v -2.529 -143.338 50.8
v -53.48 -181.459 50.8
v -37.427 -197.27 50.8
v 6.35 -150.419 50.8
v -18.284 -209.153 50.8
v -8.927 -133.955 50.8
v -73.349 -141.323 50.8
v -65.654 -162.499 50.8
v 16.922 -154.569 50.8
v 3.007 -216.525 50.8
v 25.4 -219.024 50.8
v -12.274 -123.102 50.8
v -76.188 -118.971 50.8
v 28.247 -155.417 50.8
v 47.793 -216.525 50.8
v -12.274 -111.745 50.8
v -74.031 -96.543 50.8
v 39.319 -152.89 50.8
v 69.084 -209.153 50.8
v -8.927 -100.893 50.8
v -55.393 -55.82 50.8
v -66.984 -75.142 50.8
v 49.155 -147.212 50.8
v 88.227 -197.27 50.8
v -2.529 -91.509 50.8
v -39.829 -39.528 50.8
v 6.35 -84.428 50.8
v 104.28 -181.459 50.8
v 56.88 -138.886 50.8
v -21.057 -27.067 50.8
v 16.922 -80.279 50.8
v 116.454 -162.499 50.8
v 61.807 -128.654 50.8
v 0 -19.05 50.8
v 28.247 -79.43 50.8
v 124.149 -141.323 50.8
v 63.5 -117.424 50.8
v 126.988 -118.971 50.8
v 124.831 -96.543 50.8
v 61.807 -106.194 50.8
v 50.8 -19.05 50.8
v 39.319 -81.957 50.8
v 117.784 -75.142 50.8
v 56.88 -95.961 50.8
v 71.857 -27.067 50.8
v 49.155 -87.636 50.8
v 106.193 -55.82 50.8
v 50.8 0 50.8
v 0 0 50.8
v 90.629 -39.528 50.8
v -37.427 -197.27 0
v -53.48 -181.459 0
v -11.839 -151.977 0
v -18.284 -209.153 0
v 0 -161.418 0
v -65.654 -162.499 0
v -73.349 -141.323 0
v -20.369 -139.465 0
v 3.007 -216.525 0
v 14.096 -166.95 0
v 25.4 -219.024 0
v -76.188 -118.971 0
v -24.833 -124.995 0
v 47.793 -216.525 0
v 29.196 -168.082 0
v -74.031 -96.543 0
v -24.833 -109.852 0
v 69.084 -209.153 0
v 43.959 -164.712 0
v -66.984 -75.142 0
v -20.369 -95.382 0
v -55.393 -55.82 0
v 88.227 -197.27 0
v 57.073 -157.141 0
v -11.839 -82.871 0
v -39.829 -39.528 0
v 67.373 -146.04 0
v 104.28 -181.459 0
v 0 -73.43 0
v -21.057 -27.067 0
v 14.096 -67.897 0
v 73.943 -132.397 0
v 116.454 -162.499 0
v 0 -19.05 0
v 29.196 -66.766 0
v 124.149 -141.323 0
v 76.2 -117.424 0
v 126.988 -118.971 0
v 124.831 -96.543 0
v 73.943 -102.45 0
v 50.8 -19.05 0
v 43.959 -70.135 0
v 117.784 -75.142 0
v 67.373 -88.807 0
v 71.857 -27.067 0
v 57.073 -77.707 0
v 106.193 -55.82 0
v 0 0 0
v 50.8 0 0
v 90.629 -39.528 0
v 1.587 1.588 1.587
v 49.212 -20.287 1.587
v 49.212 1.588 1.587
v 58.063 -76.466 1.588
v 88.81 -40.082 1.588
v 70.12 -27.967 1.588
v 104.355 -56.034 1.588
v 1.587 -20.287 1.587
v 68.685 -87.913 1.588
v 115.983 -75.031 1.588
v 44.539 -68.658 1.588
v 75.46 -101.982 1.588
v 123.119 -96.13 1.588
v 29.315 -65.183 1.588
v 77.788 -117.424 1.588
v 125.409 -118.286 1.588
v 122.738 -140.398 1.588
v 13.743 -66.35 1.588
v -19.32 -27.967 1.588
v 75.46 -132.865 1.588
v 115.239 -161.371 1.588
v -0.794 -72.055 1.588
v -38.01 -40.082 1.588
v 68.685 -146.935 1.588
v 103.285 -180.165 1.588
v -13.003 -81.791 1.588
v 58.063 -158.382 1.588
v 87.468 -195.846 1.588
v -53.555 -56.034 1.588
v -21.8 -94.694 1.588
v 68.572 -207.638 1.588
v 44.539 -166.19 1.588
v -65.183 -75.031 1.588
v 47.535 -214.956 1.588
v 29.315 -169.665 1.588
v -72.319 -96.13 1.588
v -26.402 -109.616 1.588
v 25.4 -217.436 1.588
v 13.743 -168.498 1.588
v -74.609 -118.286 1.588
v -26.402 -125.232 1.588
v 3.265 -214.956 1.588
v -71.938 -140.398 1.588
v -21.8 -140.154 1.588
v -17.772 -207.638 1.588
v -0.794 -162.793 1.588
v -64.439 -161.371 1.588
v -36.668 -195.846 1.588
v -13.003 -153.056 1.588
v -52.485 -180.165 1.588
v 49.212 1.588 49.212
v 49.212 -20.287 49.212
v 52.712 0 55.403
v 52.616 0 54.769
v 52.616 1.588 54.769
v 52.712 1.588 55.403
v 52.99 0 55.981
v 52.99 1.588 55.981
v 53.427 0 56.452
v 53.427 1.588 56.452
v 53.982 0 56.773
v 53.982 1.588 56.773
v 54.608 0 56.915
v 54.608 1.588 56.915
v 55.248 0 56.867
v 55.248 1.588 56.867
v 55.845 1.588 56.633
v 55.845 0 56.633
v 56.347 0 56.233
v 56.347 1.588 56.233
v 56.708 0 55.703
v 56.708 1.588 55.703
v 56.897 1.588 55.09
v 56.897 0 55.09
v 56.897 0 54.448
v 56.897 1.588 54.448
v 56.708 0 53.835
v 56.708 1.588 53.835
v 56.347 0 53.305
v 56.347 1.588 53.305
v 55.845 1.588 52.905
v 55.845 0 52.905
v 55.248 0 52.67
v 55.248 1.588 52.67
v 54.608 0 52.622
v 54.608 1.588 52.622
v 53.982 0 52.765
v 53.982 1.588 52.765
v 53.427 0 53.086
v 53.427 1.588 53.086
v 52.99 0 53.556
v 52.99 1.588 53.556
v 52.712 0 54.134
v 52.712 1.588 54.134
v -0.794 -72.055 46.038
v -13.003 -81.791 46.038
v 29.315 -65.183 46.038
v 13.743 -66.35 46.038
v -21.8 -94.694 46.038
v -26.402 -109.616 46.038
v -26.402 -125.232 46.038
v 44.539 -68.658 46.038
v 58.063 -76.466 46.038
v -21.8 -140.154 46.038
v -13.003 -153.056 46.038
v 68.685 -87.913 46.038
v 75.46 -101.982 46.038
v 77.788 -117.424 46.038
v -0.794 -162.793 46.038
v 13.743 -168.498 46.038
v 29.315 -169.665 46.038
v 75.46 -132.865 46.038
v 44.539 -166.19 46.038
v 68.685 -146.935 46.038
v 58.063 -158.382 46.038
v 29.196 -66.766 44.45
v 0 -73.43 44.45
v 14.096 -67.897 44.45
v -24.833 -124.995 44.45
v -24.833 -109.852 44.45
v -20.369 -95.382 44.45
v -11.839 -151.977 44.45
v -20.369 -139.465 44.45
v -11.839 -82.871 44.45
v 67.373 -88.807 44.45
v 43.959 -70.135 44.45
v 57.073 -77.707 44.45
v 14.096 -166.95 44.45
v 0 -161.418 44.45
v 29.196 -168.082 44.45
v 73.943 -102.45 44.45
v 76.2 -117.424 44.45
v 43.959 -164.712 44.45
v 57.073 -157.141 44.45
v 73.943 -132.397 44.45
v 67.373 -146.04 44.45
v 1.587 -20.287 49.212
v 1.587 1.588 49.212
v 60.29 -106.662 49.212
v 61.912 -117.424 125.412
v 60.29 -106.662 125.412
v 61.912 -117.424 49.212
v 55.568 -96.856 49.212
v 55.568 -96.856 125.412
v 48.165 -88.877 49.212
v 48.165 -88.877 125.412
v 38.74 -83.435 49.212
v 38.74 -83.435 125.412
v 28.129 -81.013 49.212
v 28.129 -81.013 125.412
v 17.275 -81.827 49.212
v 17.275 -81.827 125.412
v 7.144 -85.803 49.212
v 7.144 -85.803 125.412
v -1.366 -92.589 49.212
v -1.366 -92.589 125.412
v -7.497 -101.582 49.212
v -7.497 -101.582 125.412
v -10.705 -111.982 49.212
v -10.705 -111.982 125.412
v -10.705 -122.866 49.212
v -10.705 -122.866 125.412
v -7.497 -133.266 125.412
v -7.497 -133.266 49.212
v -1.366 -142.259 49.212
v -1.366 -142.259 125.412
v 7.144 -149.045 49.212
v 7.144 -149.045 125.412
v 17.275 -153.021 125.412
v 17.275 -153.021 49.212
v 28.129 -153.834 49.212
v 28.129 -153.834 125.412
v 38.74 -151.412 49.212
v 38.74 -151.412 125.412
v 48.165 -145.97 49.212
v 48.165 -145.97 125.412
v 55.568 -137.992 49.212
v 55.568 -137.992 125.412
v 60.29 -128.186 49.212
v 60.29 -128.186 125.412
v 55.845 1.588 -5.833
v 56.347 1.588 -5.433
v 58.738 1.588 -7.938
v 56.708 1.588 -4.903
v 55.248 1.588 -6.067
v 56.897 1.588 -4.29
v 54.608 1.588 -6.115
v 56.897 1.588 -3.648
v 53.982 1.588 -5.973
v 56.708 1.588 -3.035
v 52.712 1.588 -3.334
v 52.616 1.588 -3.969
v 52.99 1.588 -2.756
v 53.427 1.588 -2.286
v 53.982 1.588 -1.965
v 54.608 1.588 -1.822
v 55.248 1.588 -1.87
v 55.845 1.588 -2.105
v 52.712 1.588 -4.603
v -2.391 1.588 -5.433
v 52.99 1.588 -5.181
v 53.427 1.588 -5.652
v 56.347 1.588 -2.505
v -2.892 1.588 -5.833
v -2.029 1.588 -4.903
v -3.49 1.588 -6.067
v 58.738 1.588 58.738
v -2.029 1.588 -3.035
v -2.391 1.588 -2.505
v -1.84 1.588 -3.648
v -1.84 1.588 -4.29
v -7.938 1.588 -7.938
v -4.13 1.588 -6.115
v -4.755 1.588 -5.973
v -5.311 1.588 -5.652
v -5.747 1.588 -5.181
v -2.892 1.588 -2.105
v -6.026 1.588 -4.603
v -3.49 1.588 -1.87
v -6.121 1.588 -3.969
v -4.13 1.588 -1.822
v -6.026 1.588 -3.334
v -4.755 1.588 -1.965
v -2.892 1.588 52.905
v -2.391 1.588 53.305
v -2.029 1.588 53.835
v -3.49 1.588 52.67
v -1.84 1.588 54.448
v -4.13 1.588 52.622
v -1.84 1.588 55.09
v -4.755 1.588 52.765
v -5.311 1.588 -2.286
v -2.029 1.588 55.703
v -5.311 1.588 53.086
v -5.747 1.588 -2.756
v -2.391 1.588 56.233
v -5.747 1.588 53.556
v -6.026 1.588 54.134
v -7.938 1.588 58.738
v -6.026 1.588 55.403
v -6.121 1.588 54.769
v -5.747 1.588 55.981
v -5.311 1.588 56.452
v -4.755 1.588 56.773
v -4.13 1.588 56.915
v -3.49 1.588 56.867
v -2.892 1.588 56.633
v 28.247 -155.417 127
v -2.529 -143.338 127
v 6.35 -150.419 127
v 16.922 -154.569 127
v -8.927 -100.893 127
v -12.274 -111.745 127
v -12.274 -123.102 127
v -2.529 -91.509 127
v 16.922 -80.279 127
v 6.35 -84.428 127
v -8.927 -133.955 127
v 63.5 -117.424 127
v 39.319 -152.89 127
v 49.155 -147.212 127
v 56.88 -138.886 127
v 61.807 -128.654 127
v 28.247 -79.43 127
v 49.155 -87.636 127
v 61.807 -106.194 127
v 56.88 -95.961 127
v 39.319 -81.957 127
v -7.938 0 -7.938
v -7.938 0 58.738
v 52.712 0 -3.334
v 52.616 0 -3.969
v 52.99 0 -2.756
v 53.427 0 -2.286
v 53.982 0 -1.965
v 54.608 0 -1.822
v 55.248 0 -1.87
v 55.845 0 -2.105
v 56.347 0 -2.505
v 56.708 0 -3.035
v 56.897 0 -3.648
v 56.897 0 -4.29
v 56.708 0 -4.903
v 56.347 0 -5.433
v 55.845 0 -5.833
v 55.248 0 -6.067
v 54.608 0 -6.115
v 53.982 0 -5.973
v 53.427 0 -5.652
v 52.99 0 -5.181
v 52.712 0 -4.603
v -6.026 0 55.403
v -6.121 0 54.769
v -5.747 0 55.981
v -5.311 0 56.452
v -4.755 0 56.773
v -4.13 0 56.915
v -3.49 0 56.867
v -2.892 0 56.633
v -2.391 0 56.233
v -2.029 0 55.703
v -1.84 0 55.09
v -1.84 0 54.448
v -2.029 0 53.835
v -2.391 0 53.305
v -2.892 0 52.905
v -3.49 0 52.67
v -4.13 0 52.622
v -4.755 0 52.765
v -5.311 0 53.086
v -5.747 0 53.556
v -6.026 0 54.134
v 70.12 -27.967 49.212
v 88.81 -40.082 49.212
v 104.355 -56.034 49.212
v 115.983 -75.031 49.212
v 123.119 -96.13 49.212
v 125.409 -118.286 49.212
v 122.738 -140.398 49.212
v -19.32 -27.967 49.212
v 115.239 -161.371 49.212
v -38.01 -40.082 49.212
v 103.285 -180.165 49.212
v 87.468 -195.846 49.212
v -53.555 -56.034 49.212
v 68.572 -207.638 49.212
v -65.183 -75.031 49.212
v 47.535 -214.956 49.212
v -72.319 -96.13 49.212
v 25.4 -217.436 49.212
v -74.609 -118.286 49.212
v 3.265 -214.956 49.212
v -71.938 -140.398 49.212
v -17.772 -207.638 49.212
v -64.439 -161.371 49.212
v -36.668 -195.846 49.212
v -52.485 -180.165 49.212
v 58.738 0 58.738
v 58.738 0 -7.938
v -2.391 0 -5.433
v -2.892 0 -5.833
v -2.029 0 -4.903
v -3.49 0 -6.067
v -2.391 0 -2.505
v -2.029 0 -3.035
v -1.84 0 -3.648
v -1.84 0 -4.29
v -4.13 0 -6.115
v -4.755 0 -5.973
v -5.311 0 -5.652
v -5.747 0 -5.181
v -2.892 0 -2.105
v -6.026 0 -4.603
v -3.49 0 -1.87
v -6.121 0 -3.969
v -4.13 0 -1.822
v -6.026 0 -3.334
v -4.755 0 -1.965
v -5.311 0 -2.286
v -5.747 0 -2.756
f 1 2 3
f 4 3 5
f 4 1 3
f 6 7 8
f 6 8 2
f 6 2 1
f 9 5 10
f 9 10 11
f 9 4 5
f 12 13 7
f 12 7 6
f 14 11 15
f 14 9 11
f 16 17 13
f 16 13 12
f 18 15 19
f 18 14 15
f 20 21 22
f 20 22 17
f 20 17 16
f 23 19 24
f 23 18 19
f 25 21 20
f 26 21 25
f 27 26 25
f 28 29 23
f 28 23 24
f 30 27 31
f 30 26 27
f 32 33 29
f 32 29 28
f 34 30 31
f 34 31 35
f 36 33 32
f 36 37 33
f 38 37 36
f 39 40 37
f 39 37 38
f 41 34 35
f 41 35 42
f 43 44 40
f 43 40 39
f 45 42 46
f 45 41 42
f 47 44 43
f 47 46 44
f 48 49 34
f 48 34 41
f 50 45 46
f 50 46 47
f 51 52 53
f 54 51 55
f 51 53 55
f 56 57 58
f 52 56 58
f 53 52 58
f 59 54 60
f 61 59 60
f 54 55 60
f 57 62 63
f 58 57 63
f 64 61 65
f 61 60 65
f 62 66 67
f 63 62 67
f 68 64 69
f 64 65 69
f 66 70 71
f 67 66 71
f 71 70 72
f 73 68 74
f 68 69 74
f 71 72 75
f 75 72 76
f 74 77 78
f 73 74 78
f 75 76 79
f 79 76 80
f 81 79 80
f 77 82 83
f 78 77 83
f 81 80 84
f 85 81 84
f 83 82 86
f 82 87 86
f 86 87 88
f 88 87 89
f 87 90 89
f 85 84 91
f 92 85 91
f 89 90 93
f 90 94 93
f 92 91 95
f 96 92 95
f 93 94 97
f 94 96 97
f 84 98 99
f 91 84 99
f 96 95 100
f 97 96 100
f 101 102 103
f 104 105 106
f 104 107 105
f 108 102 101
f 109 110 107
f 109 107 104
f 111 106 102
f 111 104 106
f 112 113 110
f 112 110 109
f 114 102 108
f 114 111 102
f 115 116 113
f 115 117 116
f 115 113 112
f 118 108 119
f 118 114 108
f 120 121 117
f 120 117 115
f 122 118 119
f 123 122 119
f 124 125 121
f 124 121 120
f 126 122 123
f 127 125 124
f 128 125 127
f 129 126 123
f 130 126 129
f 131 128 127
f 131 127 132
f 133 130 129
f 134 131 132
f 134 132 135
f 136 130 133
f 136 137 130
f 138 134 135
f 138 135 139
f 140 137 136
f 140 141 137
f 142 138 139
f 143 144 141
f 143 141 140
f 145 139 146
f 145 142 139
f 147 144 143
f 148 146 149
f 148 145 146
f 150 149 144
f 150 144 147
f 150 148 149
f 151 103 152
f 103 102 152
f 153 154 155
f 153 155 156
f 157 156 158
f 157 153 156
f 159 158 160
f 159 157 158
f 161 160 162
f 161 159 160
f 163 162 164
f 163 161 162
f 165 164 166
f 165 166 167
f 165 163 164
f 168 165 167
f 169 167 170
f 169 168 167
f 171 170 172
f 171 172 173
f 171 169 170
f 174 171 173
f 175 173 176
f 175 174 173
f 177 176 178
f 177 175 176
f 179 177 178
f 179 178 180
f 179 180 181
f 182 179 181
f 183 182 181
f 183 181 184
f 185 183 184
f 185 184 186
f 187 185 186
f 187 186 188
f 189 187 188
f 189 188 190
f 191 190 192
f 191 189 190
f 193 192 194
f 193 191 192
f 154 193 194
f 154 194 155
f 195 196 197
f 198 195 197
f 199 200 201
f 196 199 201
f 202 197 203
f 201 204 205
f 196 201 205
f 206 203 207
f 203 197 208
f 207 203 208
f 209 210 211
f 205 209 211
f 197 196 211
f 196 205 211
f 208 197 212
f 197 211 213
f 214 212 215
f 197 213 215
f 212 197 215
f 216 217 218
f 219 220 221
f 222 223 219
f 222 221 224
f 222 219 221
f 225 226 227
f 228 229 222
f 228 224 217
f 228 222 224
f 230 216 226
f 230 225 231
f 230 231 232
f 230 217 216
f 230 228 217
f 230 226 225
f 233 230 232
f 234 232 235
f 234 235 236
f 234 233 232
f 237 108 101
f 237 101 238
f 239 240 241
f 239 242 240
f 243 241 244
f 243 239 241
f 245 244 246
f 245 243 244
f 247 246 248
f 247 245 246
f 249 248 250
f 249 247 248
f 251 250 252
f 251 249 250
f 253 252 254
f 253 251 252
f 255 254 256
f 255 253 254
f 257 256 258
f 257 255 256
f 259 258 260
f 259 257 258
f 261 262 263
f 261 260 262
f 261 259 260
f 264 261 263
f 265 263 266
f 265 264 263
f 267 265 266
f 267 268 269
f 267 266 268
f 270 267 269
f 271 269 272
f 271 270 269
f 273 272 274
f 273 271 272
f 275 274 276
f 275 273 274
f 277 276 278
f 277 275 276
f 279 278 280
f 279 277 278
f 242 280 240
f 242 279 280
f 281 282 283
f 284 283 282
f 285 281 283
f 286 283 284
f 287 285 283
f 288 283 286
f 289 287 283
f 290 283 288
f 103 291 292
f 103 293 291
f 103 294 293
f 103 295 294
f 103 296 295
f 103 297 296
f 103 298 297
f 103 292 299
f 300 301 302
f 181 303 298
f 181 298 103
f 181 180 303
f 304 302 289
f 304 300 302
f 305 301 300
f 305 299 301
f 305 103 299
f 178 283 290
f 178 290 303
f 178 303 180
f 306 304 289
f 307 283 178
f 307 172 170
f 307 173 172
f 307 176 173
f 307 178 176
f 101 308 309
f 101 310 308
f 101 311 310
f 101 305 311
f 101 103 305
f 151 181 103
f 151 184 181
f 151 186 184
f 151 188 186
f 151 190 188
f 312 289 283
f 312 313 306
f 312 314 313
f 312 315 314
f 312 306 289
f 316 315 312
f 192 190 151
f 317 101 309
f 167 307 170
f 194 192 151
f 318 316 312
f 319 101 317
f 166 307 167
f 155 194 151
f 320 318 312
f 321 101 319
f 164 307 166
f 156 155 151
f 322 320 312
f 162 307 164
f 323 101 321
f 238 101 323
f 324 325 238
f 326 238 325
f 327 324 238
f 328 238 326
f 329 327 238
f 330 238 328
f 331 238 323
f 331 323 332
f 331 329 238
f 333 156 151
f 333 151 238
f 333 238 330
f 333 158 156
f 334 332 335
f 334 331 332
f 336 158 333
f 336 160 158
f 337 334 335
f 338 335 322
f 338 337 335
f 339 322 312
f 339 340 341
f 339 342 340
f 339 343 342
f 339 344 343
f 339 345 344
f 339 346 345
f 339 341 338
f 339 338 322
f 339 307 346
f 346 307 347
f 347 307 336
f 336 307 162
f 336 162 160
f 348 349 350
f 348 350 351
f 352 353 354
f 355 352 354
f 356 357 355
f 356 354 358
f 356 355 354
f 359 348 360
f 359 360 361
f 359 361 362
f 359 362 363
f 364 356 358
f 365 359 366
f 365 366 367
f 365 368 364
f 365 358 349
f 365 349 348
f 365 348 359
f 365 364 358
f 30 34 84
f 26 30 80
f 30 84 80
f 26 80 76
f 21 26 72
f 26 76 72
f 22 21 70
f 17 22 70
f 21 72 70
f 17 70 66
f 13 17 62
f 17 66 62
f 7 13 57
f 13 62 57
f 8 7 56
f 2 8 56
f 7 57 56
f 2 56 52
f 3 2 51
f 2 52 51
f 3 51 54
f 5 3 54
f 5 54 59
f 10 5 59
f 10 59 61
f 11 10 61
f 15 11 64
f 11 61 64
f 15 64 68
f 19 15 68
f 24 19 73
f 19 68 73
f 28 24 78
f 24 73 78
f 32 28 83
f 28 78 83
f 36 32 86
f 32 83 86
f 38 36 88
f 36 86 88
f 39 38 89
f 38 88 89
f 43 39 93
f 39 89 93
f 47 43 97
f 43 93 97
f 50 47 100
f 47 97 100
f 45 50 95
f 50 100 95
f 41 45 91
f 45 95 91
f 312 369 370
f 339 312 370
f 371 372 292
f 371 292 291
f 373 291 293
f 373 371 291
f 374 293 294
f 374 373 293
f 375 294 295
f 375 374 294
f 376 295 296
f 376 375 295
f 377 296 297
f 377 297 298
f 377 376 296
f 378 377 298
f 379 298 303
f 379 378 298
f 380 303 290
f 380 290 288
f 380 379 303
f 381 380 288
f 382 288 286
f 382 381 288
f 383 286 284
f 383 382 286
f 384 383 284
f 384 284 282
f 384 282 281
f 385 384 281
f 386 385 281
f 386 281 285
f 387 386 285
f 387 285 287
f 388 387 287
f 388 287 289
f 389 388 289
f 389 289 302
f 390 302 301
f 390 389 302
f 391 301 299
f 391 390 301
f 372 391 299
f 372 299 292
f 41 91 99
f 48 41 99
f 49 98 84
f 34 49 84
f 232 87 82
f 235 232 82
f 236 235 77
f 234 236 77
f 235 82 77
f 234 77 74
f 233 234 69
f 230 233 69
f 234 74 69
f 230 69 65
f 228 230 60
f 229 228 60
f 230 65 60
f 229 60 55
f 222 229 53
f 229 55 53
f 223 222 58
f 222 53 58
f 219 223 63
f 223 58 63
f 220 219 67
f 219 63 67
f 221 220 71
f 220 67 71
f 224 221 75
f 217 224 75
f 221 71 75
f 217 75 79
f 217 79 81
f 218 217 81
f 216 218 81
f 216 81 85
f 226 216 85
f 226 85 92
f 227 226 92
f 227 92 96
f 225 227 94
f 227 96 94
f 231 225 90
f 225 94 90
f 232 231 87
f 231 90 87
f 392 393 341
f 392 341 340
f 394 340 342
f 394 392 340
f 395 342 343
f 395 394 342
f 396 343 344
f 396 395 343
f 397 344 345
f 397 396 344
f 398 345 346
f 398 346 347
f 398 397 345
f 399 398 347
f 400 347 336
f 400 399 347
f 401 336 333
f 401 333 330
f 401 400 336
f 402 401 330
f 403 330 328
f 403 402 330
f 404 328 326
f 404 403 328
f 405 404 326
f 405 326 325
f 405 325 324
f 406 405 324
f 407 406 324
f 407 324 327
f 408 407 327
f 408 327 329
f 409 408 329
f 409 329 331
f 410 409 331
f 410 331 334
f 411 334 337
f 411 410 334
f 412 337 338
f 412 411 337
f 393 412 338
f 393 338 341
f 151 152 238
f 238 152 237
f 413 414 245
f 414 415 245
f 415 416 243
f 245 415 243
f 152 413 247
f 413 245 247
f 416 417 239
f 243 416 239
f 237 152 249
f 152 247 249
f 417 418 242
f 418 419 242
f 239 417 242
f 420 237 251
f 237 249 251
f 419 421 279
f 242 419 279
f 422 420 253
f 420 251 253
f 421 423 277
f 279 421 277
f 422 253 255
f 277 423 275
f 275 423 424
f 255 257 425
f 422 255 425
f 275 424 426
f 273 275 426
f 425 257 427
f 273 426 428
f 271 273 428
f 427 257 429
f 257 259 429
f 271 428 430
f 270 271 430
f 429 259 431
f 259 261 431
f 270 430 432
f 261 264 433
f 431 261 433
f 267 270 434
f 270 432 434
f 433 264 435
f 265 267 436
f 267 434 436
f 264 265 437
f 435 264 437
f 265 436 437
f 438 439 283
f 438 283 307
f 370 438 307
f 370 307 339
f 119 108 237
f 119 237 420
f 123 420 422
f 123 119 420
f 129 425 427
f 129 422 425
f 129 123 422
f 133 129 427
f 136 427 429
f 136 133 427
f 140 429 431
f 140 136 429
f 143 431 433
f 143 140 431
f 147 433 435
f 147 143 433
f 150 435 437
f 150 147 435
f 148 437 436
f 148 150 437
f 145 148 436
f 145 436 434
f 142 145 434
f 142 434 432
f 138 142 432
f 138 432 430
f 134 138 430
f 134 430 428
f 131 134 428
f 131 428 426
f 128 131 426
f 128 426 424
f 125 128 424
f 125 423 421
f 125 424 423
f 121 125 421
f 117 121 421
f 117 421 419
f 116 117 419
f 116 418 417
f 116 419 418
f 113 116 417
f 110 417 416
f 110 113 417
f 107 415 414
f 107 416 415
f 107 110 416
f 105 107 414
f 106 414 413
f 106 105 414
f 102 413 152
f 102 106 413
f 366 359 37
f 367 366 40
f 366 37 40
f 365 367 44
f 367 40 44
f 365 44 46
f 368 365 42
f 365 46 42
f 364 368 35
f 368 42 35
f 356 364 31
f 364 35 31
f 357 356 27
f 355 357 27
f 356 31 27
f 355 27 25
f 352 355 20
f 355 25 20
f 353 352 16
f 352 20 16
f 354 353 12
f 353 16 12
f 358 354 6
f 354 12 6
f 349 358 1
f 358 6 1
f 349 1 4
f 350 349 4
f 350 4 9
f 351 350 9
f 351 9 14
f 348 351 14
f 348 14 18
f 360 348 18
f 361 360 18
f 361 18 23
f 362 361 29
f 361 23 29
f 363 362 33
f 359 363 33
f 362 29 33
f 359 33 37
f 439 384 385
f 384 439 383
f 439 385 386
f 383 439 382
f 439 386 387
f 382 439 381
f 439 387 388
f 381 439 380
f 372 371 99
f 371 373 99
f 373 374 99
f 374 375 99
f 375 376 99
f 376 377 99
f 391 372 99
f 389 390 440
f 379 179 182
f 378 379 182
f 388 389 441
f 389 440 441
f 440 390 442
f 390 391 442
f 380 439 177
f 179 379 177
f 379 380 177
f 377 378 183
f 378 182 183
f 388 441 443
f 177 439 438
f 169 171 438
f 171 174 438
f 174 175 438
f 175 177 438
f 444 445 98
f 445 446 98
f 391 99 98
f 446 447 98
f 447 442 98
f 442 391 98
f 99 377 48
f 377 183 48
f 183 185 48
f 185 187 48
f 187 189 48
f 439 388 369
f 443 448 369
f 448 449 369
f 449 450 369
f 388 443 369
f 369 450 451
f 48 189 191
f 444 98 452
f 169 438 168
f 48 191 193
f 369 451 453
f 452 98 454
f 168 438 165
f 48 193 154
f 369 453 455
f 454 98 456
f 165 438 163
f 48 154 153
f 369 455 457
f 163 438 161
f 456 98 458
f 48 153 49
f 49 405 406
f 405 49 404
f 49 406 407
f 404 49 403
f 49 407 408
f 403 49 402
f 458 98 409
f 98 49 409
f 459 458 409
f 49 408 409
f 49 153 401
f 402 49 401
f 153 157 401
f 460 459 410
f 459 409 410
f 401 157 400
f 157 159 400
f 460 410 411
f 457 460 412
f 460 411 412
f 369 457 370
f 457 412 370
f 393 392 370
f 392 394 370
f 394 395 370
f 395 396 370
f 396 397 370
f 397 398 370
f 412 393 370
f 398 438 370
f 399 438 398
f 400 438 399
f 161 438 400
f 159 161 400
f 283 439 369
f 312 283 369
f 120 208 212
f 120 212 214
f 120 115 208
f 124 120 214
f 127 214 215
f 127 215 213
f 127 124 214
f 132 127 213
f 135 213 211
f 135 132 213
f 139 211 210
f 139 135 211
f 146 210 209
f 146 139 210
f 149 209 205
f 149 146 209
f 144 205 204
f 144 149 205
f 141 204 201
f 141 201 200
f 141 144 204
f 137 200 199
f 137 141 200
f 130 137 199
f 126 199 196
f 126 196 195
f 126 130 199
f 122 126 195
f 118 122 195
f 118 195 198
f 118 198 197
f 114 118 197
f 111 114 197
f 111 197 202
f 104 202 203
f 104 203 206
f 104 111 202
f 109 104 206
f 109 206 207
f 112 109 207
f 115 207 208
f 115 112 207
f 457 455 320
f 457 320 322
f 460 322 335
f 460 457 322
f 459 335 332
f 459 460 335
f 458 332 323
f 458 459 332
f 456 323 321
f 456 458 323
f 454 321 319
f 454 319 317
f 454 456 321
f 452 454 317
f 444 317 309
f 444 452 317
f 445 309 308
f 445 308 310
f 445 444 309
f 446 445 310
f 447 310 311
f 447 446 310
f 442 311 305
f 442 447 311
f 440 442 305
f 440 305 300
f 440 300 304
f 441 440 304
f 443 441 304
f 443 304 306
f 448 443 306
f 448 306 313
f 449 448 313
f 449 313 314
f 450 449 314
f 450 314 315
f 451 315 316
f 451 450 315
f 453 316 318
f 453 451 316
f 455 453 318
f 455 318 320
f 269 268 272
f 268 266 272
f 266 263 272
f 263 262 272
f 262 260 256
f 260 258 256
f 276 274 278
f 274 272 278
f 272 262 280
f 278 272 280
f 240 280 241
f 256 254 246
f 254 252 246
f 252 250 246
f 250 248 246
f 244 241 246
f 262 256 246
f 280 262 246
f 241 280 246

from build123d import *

# Parameters (mm, degrees)
F1_DEPTH = 50.8
F2_R     = 38.1
F3_DEPTH = 76.2
F4_R     = 50.8
F5_DEPTH = 44.45
F6_T     = -1.5875
F7_W     = 66.675
F7_H     = 66.675
F7_R     = 2.15265
F7_W_2   = 47.625
F7_H_2   = 47.625
F8_DEPTH = 1.5875


with BuildPart() as f1:
    # F0 (on Top) → F1 (new body)
    with BuildSketch(Plane.XY):
        with BuildLine():
            Line((50.8, 0), (0, 0))
            Line((0, 0), (0, -19.05))
            ThreePointArc((0, -19.05), (25.4, -219.0237769937), (50.8, -19.05))
            Line((50.8, -19.05), (50.8, 0))
        make_face()
    extrude(amount=F1_DEPTH)

    # F2 (on face) → F3 (join)
    with BuildSketch(Plane.XY.offset(50.8)):
        with Locations((25.4, -117.4237769937)):
            Circle(F2_R)
    extrude(amount=F3_DEPTH)

    # F4 (on face) → F5 (cut)
    with BuildSketch(Plane(origin=(0, 0, 0), x_dir=(1, 0, 0), z_dir=(0, 0, -1))):
        with Locations((25.4, 117.4237769937)):
            Circle(F4_R)
    extrude(amount=-F5_DEPTH, mode=Mode.SUBTRACT)

    # F6
    f6_openings = [f1.faces().sort_by_distance(p)[0] for p in [
        (25.4, 0, 25.4),
    ]]
    offset(amount=F6_T, openings=f6_openings, kind=Kind.INTERSECTION)

    # F7 (on face) → F8 (join)
    with BuildSketch(Plane(origin=(0, 0, 0), x_dir=(-1, 0, 0), z_dir=(0, 1, 0))):
        with Locations((-25.4, 25.4)):
            Rectangle(F7_W, F7_H)
        with Locations((-54.76875, -3.96875)):
            Circle(F7_R, mode=Mode.SUBTRACT)
        with Locations((3.96875, -3.96875)):
            Circle(F7_R, mode=Mode.SUBTRACT)
        with Locations((-54.76875, 54.76875)):
            Circle(F7_R, mode=Mode.SUBTRACT)
        with Locations((-25.4, 25.4)):
            Rectangle(F7_W_2, F7_H_2, mode=Mode.SUBTRACT)
        with Locations((3.96875, 54.76875)):
            Circle(F7_R, mode=Mode.SUBTRACT)
    extrude(amount=F8_DEPTH)


solid = f1.part
